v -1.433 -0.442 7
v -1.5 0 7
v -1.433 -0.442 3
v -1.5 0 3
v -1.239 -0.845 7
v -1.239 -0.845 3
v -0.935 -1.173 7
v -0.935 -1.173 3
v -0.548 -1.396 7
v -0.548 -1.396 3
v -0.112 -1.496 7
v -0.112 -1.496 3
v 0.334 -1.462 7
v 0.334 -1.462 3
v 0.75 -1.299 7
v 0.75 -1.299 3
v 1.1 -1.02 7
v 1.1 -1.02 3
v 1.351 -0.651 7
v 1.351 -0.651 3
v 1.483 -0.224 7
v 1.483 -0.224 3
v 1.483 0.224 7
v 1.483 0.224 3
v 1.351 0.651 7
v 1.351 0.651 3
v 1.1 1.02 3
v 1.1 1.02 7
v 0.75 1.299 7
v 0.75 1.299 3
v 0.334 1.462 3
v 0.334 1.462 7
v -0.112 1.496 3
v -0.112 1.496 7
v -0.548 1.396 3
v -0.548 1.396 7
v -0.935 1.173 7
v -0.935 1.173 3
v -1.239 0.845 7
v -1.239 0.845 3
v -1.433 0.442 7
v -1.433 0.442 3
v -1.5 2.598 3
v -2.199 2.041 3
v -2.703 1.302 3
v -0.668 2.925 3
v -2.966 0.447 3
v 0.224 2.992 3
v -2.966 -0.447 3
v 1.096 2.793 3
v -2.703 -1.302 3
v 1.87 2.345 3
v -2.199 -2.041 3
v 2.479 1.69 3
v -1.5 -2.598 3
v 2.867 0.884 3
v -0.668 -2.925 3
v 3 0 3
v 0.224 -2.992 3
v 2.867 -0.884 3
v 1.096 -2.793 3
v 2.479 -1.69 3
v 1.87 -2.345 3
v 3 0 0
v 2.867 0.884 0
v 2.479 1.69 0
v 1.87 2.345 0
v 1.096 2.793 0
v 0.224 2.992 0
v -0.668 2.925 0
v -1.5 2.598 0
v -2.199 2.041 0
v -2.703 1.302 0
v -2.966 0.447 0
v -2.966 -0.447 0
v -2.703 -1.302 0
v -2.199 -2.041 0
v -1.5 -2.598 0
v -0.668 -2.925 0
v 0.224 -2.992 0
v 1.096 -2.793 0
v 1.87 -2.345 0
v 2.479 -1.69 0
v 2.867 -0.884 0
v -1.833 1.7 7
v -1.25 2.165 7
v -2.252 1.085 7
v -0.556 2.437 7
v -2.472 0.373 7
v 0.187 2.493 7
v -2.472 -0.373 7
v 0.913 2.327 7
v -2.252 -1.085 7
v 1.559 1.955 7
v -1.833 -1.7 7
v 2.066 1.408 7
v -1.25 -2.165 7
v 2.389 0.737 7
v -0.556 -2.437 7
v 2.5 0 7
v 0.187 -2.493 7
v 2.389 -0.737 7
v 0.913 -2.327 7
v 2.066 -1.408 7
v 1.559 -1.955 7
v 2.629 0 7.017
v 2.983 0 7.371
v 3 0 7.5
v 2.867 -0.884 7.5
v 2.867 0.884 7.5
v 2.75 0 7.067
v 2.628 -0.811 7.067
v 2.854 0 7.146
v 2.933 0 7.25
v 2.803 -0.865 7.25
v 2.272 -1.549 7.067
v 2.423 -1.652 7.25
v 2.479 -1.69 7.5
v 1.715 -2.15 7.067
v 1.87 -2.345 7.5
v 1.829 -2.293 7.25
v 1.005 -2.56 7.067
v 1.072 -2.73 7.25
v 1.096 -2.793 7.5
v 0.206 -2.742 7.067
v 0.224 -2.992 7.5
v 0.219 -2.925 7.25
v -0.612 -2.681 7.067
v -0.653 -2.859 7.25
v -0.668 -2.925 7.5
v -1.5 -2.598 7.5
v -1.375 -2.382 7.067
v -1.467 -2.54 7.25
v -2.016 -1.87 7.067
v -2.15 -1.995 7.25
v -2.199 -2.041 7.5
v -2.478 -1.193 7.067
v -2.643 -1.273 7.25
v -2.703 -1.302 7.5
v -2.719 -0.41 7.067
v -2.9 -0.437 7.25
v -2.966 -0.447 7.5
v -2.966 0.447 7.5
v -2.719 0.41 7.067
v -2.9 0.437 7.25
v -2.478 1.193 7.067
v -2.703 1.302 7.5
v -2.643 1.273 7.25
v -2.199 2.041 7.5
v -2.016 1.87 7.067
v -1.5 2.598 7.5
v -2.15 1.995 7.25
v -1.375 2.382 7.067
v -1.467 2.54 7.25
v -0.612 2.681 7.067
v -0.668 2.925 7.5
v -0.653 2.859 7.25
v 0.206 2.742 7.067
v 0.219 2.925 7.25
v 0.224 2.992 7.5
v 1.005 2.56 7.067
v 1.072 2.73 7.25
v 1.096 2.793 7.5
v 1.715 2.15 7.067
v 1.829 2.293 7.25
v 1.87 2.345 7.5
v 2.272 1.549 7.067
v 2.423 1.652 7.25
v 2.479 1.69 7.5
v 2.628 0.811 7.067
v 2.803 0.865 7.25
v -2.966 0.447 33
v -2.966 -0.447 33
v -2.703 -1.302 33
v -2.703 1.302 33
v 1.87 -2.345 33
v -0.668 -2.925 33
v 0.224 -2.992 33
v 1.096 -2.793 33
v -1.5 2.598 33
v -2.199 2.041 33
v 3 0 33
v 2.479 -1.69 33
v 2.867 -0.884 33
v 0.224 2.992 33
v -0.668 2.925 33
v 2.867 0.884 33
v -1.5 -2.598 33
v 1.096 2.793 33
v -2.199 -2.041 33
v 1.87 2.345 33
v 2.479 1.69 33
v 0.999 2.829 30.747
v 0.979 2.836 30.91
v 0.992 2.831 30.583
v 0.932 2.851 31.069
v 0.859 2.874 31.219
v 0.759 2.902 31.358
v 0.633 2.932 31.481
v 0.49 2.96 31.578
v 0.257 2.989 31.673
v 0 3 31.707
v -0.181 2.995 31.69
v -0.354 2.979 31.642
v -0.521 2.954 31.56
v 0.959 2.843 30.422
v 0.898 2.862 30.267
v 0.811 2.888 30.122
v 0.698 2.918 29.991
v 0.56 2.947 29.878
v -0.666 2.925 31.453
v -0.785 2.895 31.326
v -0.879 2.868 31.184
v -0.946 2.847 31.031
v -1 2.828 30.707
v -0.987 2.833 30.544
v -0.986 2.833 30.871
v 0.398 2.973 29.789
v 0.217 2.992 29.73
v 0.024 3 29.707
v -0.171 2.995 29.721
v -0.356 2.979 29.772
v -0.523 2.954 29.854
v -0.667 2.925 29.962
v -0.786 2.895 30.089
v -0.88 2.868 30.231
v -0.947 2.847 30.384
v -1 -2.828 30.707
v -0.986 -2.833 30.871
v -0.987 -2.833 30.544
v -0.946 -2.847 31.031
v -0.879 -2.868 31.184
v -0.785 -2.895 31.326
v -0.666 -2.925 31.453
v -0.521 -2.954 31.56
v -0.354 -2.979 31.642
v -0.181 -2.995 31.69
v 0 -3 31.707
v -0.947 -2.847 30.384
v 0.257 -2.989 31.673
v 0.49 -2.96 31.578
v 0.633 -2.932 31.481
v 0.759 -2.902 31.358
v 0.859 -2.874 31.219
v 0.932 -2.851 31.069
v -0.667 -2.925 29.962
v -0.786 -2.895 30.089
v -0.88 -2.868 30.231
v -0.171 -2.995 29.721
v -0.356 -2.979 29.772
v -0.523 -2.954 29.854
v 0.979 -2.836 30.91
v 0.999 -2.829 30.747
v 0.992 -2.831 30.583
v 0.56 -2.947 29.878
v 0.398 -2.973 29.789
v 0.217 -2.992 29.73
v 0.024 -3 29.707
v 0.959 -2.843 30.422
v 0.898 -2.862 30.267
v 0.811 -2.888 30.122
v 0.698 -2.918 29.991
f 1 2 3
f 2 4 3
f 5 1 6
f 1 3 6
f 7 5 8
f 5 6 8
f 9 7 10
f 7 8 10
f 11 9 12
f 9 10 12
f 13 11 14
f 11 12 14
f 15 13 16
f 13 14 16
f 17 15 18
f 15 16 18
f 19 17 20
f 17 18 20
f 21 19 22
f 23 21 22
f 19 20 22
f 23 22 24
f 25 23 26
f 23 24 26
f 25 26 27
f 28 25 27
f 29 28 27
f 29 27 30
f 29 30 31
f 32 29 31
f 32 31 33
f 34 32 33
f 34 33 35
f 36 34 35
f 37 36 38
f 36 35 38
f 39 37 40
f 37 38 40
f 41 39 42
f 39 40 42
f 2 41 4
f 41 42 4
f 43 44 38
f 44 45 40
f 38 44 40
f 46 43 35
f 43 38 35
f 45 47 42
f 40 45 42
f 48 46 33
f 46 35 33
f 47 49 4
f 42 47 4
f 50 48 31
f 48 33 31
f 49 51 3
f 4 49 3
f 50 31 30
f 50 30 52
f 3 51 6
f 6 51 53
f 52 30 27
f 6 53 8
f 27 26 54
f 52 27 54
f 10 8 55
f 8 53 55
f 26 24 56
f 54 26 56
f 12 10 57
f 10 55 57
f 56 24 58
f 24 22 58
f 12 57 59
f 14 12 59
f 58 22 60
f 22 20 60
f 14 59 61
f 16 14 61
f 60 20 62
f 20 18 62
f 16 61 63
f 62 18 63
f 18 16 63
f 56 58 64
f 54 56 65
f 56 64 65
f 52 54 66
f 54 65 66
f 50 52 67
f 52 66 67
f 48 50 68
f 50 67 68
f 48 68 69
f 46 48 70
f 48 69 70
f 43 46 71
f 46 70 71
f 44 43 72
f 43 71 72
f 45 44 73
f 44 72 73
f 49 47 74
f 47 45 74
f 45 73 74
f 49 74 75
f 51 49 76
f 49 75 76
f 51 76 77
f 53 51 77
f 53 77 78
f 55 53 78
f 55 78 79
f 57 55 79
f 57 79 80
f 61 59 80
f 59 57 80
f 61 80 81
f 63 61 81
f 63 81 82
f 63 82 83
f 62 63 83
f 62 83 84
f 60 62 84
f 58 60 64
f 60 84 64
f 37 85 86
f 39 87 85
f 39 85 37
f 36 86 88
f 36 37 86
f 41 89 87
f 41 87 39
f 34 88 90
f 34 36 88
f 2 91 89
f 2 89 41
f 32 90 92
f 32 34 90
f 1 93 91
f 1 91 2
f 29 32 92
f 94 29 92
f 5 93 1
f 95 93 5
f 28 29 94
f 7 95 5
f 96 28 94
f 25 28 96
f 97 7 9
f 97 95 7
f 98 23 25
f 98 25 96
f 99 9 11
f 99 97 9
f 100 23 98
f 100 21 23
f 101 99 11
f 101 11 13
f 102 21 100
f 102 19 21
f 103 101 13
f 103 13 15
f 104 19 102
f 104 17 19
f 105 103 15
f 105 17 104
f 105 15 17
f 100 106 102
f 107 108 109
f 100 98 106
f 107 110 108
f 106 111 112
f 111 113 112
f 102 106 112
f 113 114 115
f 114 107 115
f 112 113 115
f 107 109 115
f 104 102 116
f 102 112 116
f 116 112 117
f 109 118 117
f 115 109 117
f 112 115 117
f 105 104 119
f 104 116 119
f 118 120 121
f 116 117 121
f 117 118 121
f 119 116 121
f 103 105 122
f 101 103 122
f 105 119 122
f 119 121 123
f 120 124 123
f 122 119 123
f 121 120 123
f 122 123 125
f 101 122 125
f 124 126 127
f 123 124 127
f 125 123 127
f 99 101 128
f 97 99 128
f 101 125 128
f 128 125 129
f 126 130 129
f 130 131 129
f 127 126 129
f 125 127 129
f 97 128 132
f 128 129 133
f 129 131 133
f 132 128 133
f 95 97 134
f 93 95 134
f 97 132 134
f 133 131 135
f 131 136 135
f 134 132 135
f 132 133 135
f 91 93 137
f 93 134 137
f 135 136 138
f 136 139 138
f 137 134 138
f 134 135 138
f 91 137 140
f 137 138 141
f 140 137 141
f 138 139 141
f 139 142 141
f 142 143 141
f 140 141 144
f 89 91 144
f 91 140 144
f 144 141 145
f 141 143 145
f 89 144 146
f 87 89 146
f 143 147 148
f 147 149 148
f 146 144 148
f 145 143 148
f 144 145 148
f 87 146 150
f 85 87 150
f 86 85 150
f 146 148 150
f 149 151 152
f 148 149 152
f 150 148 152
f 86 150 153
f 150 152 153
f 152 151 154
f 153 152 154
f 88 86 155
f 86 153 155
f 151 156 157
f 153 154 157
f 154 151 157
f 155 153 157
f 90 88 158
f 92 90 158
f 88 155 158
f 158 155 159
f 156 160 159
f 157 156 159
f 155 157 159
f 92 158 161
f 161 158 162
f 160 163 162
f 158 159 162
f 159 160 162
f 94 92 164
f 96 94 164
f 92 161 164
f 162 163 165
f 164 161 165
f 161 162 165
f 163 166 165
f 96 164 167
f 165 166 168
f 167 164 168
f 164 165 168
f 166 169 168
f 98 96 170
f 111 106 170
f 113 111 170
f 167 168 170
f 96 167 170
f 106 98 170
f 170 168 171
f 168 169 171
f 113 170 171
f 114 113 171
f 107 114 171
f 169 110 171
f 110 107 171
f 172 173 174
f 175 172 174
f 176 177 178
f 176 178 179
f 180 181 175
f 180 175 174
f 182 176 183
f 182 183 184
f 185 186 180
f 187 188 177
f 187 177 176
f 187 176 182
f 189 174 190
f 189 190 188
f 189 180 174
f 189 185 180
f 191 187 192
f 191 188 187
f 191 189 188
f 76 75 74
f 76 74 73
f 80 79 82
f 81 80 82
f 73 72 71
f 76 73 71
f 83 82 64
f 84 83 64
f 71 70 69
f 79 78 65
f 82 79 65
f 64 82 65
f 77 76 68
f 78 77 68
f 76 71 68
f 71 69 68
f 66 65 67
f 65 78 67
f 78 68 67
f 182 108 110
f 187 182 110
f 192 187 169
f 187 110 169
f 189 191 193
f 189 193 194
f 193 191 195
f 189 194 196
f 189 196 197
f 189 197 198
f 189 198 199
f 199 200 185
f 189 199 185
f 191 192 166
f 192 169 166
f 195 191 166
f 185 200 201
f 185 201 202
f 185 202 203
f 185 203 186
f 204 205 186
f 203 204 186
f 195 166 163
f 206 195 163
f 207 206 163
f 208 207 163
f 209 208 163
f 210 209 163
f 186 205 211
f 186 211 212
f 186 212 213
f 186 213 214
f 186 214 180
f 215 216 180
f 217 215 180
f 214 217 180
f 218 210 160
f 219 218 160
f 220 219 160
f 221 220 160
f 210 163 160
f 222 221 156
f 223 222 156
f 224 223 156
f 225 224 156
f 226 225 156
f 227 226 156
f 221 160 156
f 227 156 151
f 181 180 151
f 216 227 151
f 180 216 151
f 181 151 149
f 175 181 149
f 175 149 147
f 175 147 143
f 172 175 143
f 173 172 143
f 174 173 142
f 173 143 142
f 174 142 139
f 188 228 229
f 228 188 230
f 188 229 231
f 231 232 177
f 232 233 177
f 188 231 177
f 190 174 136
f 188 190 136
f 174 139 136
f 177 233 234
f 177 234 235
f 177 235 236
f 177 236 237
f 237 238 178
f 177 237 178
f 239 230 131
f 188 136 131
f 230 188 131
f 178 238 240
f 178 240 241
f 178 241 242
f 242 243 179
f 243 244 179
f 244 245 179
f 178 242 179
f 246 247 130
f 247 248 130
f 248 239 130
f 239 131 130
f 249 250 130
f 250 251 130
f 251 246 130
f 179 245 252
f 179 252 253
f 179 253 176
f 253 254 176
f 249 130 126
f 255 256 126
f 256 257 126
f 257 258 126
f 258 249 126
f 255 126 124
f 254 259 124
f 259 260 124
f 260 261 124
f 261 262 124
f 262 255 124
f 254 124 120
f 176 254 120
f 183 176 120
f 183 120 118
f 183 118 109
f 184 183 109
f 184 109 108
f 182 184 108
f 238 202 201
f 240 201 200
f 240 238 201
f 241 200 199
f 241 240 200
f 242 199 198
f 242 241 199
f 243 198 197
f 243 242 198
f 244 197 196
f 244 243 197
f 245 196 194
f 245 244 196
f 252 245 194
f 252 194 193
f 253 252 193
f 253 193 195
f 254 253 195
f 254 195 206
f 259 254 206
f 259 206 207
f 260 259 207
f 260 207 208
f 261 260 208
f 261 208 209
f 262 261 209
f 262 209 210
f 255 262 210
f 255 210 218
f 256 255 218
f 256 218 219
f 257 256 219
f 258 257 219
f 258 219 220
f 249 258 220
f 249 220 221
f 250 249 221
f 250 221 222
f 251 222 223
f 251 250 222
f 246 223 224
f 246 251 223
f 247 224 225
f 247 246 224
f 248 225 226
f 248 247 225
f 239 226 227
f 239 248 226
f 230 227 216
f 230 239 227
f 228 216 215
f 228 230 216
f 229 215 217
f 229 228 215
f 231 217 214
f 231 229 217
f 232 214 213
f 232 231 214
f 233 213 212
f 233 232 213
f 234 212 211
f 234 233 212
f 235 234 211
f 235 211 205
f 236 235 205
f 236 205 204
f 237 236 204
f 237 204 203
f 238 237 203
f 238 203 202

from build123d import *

# Parameters (mm, degrees)
SKETCH1_R               = 3
BOSS_EXTRUDE1_DEPTH     = 33
SKETCH2_W               = 1.5
SKETCH2_H               = 4
FILLET2_R               = 0.5
CUT_EXTRUDE2_DEPTH      = 34.271609528
CUT_EXTRUDE2_DEPTH_BACK = 34.271609528
SKETCH3_R               = 1


with BuildPart() as part:
    # Sketch1 → Boss-Extrude1 (new body)
    with BuildSketch(Plane.XY):
        Circle(SKETCH1_R)
    extrude(amount=BOSS_EXTRUDE1_DEPTH)

    # Sketch2 → Cut-Revolve1 (revolve, cut)
    with BuildSketch(Plane(origin=(0, 0, 0), x_dir=(1, 0, 0), z_dir=(0, 1, 0)), mode=Mode.PRIVATE) as cut_revolve1_sk:
        with Locations((2.25, -5)):
            Rectangle(SKETCH2_W, SKETCH2_H)
    revolve(cut_revolve1_sk.sketch.rotate(Axis((0, 0, 0), (0, 0, 1)), 180), axis=Axis((0, 0, 0), (0, 0, 1)), mode=Mode.SUBTRACT)

    # Fillet2
    fillet2_edges = [part.edges().sort_by_distance(p)[0] for p in [
        (-3, 0, 7),
    ]]
    fillet(fillet2_edges, radius=FILLET2_R)

    # Sketch3 → Cut-Extrude2 (cut, two sides: drawn at the far end of the back side and taken through both)
    with BuildSketch(Plane(origin=(0, 0, 0), x_dir=(1, 0, 0), z_dir=(0, 1, 0)).offset(-CUT_EXTRUDE2_DEPTH_BACK)):
        with Locations(Location((0, -30.706648015, 0), (0, 0, 270))):
            Circle(SKETCH3_R)
    extrude(amount=CUT_EXTRUDE2_DEPTH + CUT_EXTRUDE2_DEPTH_BACK, mode=Mode.SUBTRACT)


solid = part.part
